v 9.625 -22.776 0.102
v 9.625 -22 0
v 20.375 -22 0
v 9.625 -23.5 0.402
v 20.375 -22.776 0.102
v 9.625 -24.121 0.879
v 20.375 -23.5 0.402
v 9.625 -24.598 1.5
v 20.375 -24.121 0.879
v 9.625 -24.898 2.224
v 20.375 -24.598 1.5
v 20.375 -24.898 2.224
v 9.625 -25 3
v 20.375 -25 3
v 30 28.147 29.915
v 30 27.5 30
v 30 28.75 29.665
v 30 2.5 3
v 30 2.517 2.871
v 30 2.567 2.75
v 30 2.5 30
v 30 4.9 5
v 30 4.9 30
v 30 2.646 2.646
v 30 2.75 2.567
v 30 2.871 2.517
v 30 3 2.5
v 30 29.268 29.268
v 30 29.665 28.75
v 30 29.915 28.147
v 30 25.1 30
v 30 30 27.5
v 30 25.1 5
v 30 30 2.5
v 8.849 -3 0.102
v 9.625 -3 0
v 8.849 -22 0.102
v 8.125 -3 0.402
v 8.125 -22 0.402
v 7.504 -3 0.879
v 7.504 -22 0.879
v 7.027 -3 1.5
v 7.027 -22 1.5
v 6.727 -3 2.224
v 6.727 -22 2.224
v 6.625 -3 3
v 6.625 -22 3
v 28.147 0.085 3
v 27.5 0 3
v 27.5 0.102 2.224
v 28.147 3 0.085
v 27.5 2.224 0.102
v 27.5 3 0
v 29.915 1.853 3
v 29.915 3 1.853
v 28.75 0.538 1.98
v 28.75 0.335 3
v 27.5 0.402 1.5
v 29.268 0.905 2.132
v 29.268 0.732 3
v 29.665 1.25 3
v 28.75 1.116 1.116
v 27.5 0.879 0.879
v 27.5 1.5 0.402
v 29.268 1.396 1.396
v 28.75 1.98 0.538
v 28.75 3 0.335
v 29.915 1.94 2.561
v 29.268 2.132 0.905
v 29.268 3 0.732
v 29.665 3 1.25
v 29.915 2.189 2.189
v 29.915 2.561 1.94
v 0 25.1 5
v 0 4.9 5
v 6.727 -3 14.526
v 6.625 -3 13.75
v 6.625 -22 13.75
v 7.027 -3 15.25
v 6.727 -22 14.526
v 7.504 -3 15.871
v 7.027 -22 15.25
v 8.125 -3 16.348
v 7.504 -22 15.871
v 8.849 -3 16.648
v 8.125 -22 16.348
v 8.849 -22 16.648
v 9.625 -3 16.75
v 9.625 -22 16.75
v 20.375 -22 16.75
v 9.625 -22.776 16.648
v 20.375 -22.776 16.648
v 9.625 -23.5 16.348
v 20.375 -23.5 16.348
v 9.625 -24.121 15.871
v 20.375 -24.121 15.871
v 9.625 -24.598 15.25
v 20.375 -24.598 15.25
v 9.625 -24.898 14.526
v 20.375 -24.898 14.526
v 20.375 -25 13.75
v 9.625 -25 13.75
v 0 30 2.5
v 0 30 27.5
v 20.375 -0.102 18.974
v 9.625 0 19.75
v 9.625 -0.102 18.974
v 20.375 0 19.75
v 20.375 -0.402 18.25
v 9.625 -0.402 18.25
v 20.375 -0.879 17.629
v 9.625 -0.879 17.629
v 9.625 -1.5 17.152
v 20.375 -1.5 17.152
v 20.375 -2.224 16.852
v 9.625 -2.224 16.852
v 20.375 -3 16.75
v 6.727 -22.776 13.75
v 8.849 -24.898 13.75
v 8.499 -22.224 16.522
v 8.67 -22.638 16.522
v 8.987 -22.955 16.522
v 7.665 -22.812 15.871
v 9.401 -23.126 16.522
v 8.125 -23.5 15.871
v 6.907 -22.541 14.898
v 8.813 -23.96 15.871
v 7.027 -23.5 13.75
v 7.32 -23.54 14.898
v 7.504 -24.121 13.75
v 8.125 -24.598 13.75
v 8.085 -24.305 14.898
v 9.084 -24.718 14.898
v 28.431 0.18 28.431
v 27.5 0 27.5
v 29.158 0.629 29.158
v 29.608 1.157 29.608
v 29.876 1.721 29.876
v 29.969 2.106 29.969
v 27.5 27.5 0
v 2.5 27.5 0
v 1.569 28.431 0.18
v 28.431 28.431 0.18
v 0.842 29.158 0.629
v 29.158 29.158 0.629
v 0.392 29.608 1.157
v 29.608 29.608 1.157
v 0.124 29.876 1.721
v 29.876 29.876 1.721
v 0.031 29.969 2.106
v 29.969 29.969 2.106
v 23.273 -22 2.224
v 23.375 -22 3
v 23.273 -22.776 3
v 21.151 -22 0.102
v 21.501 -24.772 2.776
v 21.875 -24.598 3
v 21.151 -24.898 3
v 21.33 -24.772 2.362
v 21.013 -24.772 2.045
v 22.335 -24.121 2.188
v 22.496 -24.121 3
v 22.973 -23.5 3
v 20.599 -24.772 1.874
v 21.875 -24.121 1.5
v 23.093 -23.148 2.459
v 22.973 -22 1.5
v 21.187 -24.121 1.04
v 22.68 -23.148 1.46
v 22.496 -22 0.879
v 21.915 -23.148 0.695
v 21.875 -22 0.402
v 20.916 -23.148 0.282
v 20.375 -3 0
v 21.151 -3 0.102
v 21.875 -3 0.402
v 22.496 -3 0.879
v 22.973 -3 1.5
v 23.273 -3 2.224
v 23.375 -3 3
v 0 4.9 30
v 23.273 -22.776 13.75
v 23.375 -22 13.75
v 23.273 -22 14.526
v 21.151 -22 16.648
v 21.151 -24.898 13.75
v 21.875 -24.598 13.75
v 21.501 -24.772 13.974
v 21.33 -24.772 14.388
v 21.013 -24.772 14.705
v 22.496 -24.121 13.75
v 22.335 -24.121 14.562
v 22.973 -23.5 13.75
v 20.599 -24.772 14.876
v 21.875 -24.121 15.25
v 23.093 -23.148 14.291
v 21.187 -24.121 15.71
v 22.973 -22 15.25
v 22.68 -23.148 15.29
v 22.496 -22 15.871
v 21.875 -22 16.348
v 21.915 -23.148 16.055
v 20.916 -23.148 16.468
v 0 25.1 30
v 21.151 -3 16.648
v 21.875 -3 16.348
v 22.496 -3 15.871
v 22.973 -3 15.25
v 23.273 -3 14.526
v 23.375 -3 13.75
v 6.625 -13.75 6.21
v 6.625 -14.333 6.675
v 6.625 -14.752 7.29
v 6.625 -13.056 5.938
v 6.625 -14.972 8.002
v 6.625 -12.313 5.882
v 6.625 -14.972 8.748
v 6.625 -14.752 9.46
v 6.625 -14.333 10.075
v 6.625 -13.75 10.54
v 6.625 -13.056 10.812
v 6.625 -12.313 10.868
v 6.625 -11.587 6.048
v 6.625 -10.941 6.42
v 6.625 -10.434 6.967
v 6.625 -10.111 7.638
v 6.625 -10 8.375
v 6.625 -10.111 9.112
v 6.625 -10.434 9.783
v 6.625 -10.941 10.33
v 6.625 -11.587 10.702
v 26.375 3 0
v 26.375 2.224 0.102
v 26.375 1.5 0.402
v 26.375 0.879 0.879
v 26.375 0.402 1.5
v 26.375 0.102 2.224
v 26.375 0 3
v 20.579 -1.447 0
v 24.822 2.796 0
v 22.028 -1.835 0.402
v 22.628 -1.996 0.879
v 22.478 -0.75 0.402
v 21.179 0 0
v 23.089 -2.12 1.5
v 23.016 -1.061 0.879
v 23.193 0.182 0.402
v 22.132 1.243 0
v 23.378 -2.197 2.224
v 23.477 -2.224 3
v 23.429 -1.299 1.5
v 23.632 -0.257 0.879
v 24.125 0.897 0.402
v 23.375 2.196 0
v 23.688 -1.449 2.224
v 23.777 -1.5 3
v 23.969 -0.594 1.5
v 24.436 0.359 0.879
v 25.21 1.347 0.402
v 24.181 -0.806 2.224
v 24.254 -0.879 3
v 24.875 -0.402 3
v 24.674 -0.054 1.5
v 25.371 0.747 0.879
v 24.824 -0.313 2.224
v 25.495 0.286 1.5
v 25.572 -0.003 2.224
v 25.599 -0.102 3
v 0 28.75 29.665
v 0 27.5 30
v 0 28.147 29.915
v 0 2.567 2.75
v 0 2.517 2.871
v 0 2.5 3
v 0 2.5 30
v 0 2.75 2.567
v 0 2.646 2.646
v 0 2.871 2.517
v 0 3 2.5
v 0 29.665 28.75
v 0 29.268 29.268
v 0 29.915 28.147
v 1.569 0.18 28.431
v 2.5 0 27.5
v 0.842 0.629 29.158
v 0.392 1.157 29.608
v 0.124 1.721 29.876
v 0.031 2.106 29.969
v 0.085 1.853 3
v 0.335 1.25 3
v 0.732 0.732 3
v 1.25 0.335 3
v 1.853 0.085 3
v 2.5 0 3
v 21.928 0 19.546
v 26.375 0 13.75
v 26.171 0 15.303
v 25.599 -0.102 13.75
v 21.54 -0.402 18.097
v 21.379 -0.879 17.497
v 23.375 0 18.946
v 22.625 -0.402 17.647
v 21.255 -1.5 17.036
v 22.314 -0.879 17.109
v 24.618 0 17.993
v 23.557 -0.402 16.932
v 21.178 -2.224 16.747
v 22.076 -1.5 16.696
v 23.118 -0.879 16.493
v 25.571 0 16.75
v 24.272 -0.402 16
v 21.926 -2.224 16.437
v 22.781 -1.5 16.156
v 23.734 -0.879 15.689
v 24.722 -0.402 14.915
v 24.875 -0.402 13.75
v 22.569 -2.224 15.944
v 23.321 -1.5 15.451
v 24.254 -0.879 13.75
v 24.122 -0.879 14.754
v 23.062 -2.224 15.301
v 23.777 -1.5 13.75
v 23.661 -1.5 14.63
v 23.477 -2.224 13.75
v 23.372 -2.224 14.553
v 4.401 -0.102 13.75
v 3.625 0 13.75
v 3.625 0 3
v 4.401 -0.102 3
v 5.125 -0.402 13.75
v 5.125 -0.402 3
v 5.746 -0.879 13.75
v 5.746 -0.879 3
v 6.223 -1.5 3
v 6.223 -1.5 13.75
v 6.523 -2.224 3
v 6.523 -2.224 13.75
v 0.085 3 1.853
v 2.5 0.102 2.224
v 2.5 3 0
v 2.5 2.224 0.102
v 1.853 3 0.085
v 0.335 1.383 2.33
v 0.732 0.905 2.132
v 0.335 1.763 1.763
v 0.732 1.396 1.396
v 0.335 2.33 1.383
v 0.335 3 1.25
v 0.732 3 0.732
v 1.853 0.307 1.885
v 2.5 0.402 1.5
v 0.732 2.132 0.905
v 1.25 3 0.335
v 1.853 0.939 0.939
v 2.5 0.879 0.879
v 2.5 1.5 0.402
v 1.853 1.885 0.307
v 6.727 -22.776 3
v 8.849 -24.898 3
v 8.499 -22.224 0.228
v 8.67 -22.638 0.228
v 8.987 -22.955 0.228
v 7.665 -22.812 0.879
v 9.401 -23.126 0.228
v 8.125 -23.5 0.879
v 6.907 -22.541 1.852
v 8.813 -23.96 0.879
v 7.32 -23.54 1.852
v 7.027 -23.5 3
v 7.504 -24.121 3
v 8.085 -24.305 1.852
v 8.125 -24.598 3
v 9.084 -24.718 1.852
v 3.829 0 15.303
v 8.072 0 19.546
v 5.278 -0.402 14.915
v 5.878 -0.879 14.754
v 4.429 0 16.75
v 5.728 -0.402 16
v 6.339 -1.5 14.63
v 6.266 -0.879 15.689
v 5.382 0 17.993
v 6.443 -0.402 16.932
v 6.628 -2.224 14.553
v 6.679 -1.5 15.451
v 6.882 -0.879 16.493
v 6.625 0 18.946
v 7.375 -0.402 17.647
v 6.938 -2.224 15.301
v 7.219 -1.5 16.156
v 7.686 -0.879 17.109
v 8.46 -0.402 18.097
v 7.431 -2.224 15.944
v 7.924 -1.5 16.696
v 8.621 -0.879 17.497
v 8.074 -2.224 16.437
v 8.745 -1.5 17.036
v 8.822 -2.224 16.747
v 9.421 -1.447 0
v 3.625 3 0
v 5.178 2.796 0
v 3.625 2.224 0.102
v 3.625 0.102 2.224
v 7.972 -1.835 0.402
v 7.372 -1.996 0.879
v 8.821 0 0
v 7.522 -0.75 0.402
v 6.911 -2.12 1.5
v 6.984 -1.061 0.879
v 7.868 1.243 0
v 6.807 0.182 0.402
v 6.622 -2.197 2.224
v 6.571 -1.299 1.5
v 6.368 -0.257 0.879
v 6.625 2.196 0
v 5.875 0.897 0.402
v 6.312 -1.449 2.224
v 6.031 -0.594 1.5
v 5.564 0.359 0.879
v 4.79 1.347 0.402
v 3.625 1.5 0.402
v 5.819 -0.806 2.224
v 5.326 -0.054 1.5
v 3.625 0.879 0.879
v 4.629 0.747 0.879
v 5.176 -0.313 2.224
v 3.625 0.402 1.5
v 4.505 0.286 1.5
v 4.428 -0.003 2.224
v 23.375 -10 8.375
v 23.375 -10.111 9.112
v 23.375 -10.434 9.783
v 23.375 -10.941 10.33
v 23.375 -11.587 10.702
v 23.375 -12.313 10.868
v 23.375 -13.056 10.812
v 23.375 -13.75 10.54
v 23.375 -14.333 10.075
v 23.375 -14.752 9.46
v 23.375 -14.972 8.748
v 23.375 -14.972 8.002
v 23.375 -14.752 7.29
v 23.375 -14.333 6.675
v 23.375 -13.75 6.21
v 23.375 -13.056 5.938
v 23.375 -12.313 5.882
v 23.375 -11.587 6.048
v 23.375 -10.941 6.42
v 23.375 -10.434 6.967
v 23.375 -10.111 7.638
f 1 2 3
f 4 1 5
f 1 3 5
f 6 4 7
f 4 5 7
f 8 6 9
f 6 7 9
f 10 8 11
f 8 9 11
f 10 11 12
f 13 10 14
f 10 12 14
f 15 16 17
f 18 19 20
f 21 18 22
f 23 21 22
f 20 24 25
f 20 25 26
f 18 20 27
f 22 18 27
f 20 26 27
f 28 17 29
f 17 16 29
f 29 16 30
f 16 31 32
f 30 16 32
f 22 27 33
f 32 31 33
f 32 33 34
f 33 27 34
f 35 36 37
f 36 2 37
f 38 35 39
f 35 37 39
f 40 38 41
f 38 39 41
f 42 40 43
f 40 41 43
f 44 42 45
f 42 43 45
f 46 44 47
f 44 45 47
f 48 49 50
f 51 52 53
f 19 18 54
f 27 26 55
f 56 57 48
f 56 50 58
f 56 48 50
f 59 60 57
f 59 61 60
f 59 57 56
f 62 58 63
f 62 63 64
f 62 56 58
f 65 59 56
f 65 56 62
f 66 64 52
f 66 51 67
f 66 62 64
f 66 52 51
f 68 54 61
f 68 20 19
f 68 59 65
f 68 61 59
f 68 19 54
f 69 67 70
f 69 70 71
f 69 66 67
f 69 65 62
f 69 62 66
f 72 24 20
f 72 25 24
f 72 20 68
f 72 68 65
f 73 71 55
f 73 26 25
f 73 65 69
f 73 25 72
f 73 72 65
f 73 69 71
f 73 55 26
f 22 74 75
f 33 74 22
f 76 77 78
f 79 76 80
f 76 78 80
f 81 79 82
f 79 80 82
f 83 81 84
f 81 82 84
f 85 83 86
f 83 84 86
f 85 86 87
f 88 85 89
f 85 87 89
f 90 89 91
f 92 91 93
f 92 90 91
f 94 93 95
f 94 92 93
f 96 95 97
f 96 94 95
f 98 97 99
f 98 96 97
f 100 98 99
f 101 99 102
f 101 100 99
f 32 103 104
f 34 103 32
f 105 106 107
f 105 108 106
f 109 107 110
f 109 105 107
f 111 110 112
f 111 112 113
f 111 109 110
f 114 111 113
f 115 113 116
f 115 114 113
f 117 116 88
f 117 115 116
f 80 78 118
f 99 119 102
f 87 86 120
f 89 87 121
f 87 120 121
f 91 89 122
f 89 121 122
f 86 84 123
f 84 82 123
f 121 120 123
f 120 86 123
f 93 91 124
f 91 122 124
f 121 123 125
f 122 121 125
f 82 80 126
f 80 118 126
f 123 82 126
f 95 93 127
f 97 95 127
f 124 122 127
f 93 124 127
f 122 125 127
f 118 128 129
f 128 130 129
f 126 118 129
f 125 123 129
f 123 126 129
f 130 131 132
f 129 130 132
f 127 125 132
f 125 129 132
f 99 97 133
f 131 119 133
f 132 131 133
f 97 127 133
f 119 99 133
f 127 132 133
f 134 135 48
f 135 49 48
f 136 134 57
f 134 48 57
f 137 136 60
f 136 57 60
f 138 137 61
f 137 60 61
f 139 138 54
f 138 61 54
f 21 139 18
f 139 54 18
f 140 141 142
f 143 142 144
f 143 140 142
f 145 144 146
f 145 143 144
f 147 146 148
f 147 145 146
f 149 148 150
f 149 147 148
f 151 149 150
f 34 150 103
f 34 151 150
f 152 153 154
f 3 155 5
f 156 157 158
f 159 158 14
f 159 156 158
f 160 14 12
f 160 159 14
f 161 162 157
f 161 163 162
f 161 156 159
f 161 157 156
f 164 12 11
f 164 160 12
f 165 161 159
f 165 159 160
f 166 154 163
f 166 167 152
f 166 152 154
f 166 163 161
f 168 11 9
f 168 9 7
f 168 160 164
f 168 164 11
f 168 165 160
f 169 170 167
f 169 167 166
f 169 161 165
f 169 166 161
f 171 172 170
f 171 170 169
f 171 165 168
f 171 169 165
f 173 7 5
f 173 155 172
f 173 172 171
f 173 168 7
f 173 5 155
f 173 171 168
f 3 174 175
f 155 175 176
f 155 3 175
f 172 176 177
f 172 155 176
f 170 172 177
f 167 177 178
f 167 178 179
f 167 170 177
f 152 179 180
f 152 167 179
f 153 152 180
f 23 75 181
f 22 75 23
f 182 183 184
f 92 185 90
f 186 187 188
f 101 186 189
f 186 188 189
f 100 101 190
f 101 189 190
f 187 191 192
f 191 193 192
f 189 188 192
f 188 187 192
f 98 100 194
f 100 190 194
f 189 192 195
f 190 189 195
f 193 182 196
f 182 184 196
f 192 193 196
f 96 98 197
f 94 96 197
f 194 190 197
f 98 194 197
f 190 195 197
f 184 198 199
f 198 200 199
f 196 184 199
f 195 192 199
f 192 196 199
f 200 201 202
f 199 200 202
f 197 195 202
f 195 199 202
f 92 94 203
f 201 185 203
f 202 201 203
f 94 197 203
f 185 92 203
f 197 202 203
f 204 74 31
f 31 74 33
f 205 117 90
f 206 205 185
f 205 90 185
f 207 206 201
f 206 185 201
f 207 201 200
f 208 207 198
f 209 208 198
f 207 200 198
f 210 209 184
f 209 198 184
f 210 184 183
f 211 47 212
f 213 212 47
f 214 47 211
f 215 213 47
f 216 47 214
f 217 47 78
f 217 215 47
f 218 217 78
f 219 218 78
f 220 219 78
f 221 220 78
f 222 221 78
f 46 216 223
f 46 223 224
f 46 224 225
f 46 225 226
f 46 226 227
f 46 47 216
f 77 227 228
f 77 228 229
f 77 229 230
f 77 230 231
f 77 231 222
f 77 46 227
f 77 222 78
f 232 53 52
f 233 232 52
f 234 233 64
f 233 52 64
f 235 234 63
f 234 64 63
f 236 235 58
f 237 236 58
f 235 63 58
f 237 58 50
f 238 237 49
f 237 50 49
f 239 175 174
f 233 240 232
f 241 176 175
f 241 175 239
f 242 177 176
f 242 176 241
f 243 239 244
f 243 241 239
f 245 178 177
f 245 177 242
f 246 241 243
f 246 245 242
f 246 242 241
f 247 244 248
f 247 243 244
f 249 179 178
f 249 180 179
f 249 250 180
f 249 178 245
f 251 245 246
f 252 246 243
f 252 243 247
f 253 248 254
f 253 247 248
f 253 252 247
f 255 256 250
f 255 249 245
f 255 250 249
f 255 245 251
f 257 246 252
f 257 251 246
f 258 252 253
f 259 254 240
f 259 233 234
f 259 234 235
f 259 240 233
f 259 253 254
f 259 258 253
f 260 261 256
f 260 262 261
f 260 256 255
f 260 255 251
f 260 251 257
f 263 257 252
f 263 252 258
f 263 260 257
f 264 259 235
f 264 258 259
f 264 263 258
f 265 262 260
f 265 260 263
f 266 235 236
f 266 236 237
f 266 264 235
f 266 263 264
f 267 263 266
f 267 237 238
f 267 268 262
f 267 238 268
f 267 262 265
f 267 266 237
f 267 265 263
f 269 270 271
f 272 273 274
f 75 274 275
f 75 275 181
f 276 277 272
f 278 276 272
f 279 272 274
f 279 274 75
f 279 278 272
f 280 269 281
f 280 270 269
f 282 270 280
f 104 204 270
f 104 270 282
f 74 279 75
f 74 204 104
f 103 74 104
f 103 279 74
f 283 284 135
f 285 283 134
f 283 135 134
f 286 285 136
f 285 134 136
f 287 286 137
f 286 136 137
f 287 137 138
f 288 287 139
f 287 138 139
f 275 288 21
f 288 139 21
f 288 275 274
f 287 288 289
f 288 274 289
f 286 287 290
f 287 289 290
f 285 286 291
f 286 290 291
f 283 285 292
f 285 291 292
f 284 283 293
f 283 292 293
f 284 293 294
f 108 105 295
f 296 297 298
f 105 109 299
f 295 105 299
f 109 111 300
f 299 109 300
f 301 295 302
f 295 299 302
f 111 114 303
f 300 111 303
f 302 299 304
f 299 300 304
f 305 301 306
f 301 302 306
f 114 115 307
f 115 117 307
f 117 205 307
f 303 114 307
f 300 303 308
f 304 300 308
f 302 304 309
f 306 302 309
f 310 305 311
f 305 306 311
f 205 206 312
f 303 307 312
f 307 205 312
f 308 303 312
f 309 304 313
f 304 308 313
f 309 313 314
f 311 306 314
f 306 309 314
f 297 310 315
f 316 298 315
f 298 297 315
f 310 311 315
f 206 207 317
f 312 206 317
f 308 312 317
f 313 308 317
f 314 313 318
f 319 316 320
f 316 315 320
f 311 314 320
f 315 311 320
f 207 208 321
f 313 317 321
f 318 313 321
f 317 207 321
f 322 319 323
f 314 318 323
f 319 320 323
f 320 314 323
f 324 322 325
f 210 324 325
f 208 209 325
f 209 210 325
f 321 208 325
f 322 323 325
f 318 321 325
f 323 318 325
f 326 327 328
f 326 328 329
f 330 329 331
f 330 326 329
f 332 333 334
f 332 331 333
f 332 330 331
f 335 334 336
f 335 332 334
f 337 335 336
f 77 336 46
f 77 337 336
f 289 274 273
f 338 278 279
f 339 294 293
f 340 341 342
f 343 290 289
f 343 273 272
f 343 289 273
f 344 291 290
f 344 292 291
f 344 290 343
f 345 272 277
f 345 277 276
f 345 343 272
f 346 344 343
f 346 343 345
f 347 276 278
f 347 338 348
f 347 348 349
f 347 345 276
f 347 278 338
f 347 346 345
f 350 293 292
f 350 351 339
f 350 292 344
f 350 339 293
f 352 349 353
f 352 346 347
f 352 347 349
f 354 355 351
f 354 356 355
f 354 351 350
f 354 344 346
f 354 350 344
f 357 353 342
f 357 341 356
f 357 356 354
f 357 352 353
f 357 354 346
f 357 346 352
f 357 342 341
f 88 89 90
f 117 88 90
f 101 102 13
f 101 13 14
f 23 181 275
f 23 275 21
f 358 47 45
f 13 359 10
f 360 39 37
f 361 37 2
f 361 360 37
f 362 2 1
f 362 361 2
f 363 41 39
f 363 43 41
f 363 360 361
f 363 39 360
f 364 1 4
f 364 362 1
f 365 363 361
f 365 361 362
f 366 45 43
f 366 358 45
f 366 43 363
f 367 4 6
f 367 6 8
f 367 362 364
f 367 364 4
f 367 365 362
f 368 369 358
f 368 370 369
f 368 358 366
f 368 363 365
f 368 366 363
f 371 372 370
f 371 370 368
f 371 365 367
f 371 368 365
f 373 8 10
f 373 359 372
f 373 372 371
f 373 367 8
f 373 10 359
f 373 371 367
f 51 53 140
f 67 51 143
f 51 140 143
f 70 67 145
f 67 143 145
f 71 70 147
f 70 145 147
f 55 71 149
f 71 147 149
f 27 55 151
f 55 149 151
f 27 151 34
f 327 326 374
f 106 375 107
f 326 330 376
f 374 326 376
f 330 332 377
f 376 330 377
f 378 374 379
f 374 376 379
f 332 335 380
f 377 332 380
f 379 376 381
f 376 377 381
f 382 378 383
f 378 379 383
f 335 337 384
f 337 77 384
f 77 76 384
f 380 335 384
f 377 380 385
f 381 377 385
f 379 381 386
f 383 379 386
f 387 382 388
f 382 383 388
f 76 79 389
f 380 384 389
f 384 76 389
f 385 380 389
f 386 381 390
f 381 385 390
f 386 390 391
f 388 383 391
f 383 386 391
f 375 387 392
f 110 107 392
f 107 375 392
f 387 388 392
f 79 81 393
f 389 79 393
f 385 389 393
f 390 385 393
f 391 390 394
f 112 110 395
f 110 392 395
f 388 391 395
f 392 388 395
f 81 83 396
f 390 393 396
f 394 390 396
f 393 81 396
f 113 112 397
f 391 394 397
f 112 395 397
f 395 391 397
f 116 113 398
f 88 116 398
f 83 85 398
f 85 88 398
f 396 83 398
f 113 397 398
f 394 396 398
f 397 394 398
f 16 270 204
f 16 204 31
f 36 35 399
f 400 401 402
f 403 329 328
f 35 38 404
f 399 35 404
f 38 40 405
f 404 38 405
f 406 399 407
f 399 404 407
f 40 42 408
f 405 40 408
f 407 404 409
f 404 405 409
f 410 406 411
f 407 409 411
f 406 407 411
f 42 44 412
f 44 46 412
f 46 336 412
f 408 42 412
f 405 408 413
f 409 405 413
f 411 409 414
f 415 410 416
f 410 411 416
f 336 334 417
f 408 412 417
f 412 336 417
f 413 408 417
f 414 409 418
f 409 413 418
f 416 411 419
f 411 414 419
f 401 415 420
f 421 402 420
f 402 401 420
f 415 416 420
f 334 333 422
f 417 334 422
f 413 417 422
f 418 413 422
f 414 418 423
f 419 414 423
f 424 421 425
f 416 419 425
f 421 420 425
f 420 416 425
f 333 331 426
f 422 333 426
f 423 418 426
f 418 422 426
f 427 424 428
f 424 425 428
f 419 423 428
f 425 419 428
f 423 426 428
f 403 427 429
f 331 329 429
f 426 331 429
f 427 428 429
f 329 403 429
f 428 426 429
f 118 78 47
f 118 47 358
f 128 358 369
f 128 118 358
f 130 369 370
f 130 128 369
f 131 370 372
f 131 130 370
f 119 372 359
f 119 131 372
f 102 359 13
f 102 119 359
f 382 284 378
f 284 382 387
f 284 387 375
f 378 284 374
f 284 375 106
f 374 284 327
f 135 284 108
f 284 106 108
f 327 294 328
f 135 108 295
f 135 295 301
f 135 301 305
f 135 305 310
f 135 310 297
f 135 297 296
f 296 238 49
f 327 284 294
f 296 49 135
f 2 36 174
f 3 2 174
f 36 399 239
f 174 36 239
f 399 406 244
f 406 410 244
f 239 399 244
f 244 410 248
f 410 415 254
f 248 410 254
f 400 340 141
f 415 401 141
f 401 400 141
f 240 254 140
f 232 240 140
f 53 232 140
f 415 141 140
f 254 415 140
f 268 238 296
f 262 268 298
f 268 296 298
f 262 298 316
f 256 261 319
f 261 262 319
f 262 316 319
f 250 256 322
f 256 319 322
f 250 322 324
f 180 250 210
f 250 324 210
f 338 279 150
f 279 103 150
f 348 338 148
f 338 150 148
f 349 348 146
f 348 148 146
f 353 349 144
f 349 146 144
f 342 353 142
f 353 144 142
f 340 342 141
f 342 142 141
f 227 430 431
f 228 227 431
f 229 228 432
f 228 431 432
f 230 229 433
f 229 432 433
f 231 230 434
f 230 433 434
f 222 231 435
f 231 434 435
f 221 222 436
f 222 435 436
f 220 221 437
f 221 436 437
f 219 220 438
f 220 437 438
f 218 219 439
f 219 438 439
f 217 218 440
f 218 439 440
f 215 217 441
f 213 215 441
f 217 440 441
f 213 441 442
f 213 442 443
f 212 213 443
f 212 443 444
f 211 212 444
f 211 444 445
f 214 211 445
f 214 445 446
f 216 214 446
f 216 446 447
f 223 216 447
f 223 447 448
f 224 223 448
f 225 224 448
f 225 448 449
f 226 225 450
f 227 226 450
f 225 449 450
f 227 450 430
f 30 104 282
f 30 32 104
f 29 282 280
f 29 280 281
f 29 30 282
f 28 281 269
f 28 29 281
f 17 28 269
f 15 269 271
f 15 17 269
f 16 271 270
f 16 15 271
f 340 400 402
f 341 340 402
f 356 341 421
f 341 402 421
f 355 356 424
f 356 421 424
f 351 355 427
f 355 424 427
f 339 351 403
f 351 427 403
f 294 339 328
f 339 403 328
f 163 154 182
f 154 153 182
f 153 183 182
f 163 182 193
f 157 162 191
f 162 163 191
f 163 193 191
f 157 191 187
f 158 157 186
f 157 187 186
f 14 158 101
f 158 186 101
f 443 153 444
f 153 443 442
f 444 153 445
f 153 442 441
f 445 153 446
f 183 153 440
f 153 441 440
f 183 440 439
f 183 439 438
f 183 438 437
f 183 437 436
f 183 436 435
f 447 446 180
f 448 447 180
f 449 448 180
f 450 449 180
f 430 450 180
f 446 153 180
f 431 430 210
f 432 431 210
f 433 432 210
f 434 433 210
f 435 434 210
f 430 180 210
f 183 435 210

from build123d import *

# Parameters (mm, degrees)
F0_W      = 30
F0_H      = 30
F1_DEPTH  = 5
F2_W      = 30
F2_H      = 4.9
F3_DEPTH  = 25
F4_W      = 16.75
F4_H      = 16.75
F5_DEPTH  = 25
F6_R      = 3
F7_R      = 2.5
F9_R      = 2.5
F10_DEPTH = 16.75


# Not quite as in the source:
# - two fillets or chamfers of one size are made in one step
# - a feature names something its author has since deleted; it is built from what else it names


with BuildPart() as f1:
    # F0 (on Top) → F1 (new body)
    with BuildSketch(Plane.XY):
        with Locations((15, 15)):
            Rectangle(F0_W, F0_H)
    extrude(amount=F1_DEPTH)

    # F2 (on face) → F3 (join)
    with BuildSketch(Plane.XY.offset(5)):
        with Locations((15, 27.55)):
            Rectangle(F2_W, F2_H)
        with Locations((15, 2.45)):
            Rectangle(F2_W, F2_H)
    extrude(amount=F3_DEPTH)

    # F4 (on face) → F5 (join)
    with BuildSketch(Plane.XZ):
        with Locations((15, 8.375)):
            Rectangle(F4_W, F4_H)
    extrude(amount=F5_DEPTH)

    # F6
    f6_edges = [f1.edges().sort_by_distance(p)[0] for p in [
        (6.625, -25, 8.375),
        (23.375, 0, 8.375),
        (23.375, -12.5, 0),
        (23.375, -12.5, 16.75),
        (23.375, -25, 8.375),
        (3.3125, 0, 0),
        (6.625, 0, 8.375),
        (15, 0, 16.75),
        (26.6875, 0, 0),
        (6.625, -12.5, 0),
        (15, -25, 0),
        (6.625, -12.5, 16.75),
        (15, -25, 16.75),
    ]]
    fillet(f6_edges, radius=F6_R)

    # F7
    f7_edges = [f1.edges().sort_by_distance(p)[0] for p in [
        (15, 30, 30),
        (15, 0, 30),
        (15, 30, 0),
        (30, 16.5, 0),
        (0, 16.5, 0),
        (0, 0, 16.5),
        (0, 0.87868, 0.87868),
        (30, 0, 16.5),
        (30, 0.87868, 0.87868),
    ]]
    fillet(f7_edges, radius=F7_R)

    # F9 (on face) → F10 (cut, through all)
    with BuildSketch(Plane.YZ.offset(23.375)):
        with Locations((-12.5, 8.375)):
            Circle(F9_R)
    extrude(amount=-F10_DEPTH, mode=Mode.SUBTRACT)


solid = f1.part
